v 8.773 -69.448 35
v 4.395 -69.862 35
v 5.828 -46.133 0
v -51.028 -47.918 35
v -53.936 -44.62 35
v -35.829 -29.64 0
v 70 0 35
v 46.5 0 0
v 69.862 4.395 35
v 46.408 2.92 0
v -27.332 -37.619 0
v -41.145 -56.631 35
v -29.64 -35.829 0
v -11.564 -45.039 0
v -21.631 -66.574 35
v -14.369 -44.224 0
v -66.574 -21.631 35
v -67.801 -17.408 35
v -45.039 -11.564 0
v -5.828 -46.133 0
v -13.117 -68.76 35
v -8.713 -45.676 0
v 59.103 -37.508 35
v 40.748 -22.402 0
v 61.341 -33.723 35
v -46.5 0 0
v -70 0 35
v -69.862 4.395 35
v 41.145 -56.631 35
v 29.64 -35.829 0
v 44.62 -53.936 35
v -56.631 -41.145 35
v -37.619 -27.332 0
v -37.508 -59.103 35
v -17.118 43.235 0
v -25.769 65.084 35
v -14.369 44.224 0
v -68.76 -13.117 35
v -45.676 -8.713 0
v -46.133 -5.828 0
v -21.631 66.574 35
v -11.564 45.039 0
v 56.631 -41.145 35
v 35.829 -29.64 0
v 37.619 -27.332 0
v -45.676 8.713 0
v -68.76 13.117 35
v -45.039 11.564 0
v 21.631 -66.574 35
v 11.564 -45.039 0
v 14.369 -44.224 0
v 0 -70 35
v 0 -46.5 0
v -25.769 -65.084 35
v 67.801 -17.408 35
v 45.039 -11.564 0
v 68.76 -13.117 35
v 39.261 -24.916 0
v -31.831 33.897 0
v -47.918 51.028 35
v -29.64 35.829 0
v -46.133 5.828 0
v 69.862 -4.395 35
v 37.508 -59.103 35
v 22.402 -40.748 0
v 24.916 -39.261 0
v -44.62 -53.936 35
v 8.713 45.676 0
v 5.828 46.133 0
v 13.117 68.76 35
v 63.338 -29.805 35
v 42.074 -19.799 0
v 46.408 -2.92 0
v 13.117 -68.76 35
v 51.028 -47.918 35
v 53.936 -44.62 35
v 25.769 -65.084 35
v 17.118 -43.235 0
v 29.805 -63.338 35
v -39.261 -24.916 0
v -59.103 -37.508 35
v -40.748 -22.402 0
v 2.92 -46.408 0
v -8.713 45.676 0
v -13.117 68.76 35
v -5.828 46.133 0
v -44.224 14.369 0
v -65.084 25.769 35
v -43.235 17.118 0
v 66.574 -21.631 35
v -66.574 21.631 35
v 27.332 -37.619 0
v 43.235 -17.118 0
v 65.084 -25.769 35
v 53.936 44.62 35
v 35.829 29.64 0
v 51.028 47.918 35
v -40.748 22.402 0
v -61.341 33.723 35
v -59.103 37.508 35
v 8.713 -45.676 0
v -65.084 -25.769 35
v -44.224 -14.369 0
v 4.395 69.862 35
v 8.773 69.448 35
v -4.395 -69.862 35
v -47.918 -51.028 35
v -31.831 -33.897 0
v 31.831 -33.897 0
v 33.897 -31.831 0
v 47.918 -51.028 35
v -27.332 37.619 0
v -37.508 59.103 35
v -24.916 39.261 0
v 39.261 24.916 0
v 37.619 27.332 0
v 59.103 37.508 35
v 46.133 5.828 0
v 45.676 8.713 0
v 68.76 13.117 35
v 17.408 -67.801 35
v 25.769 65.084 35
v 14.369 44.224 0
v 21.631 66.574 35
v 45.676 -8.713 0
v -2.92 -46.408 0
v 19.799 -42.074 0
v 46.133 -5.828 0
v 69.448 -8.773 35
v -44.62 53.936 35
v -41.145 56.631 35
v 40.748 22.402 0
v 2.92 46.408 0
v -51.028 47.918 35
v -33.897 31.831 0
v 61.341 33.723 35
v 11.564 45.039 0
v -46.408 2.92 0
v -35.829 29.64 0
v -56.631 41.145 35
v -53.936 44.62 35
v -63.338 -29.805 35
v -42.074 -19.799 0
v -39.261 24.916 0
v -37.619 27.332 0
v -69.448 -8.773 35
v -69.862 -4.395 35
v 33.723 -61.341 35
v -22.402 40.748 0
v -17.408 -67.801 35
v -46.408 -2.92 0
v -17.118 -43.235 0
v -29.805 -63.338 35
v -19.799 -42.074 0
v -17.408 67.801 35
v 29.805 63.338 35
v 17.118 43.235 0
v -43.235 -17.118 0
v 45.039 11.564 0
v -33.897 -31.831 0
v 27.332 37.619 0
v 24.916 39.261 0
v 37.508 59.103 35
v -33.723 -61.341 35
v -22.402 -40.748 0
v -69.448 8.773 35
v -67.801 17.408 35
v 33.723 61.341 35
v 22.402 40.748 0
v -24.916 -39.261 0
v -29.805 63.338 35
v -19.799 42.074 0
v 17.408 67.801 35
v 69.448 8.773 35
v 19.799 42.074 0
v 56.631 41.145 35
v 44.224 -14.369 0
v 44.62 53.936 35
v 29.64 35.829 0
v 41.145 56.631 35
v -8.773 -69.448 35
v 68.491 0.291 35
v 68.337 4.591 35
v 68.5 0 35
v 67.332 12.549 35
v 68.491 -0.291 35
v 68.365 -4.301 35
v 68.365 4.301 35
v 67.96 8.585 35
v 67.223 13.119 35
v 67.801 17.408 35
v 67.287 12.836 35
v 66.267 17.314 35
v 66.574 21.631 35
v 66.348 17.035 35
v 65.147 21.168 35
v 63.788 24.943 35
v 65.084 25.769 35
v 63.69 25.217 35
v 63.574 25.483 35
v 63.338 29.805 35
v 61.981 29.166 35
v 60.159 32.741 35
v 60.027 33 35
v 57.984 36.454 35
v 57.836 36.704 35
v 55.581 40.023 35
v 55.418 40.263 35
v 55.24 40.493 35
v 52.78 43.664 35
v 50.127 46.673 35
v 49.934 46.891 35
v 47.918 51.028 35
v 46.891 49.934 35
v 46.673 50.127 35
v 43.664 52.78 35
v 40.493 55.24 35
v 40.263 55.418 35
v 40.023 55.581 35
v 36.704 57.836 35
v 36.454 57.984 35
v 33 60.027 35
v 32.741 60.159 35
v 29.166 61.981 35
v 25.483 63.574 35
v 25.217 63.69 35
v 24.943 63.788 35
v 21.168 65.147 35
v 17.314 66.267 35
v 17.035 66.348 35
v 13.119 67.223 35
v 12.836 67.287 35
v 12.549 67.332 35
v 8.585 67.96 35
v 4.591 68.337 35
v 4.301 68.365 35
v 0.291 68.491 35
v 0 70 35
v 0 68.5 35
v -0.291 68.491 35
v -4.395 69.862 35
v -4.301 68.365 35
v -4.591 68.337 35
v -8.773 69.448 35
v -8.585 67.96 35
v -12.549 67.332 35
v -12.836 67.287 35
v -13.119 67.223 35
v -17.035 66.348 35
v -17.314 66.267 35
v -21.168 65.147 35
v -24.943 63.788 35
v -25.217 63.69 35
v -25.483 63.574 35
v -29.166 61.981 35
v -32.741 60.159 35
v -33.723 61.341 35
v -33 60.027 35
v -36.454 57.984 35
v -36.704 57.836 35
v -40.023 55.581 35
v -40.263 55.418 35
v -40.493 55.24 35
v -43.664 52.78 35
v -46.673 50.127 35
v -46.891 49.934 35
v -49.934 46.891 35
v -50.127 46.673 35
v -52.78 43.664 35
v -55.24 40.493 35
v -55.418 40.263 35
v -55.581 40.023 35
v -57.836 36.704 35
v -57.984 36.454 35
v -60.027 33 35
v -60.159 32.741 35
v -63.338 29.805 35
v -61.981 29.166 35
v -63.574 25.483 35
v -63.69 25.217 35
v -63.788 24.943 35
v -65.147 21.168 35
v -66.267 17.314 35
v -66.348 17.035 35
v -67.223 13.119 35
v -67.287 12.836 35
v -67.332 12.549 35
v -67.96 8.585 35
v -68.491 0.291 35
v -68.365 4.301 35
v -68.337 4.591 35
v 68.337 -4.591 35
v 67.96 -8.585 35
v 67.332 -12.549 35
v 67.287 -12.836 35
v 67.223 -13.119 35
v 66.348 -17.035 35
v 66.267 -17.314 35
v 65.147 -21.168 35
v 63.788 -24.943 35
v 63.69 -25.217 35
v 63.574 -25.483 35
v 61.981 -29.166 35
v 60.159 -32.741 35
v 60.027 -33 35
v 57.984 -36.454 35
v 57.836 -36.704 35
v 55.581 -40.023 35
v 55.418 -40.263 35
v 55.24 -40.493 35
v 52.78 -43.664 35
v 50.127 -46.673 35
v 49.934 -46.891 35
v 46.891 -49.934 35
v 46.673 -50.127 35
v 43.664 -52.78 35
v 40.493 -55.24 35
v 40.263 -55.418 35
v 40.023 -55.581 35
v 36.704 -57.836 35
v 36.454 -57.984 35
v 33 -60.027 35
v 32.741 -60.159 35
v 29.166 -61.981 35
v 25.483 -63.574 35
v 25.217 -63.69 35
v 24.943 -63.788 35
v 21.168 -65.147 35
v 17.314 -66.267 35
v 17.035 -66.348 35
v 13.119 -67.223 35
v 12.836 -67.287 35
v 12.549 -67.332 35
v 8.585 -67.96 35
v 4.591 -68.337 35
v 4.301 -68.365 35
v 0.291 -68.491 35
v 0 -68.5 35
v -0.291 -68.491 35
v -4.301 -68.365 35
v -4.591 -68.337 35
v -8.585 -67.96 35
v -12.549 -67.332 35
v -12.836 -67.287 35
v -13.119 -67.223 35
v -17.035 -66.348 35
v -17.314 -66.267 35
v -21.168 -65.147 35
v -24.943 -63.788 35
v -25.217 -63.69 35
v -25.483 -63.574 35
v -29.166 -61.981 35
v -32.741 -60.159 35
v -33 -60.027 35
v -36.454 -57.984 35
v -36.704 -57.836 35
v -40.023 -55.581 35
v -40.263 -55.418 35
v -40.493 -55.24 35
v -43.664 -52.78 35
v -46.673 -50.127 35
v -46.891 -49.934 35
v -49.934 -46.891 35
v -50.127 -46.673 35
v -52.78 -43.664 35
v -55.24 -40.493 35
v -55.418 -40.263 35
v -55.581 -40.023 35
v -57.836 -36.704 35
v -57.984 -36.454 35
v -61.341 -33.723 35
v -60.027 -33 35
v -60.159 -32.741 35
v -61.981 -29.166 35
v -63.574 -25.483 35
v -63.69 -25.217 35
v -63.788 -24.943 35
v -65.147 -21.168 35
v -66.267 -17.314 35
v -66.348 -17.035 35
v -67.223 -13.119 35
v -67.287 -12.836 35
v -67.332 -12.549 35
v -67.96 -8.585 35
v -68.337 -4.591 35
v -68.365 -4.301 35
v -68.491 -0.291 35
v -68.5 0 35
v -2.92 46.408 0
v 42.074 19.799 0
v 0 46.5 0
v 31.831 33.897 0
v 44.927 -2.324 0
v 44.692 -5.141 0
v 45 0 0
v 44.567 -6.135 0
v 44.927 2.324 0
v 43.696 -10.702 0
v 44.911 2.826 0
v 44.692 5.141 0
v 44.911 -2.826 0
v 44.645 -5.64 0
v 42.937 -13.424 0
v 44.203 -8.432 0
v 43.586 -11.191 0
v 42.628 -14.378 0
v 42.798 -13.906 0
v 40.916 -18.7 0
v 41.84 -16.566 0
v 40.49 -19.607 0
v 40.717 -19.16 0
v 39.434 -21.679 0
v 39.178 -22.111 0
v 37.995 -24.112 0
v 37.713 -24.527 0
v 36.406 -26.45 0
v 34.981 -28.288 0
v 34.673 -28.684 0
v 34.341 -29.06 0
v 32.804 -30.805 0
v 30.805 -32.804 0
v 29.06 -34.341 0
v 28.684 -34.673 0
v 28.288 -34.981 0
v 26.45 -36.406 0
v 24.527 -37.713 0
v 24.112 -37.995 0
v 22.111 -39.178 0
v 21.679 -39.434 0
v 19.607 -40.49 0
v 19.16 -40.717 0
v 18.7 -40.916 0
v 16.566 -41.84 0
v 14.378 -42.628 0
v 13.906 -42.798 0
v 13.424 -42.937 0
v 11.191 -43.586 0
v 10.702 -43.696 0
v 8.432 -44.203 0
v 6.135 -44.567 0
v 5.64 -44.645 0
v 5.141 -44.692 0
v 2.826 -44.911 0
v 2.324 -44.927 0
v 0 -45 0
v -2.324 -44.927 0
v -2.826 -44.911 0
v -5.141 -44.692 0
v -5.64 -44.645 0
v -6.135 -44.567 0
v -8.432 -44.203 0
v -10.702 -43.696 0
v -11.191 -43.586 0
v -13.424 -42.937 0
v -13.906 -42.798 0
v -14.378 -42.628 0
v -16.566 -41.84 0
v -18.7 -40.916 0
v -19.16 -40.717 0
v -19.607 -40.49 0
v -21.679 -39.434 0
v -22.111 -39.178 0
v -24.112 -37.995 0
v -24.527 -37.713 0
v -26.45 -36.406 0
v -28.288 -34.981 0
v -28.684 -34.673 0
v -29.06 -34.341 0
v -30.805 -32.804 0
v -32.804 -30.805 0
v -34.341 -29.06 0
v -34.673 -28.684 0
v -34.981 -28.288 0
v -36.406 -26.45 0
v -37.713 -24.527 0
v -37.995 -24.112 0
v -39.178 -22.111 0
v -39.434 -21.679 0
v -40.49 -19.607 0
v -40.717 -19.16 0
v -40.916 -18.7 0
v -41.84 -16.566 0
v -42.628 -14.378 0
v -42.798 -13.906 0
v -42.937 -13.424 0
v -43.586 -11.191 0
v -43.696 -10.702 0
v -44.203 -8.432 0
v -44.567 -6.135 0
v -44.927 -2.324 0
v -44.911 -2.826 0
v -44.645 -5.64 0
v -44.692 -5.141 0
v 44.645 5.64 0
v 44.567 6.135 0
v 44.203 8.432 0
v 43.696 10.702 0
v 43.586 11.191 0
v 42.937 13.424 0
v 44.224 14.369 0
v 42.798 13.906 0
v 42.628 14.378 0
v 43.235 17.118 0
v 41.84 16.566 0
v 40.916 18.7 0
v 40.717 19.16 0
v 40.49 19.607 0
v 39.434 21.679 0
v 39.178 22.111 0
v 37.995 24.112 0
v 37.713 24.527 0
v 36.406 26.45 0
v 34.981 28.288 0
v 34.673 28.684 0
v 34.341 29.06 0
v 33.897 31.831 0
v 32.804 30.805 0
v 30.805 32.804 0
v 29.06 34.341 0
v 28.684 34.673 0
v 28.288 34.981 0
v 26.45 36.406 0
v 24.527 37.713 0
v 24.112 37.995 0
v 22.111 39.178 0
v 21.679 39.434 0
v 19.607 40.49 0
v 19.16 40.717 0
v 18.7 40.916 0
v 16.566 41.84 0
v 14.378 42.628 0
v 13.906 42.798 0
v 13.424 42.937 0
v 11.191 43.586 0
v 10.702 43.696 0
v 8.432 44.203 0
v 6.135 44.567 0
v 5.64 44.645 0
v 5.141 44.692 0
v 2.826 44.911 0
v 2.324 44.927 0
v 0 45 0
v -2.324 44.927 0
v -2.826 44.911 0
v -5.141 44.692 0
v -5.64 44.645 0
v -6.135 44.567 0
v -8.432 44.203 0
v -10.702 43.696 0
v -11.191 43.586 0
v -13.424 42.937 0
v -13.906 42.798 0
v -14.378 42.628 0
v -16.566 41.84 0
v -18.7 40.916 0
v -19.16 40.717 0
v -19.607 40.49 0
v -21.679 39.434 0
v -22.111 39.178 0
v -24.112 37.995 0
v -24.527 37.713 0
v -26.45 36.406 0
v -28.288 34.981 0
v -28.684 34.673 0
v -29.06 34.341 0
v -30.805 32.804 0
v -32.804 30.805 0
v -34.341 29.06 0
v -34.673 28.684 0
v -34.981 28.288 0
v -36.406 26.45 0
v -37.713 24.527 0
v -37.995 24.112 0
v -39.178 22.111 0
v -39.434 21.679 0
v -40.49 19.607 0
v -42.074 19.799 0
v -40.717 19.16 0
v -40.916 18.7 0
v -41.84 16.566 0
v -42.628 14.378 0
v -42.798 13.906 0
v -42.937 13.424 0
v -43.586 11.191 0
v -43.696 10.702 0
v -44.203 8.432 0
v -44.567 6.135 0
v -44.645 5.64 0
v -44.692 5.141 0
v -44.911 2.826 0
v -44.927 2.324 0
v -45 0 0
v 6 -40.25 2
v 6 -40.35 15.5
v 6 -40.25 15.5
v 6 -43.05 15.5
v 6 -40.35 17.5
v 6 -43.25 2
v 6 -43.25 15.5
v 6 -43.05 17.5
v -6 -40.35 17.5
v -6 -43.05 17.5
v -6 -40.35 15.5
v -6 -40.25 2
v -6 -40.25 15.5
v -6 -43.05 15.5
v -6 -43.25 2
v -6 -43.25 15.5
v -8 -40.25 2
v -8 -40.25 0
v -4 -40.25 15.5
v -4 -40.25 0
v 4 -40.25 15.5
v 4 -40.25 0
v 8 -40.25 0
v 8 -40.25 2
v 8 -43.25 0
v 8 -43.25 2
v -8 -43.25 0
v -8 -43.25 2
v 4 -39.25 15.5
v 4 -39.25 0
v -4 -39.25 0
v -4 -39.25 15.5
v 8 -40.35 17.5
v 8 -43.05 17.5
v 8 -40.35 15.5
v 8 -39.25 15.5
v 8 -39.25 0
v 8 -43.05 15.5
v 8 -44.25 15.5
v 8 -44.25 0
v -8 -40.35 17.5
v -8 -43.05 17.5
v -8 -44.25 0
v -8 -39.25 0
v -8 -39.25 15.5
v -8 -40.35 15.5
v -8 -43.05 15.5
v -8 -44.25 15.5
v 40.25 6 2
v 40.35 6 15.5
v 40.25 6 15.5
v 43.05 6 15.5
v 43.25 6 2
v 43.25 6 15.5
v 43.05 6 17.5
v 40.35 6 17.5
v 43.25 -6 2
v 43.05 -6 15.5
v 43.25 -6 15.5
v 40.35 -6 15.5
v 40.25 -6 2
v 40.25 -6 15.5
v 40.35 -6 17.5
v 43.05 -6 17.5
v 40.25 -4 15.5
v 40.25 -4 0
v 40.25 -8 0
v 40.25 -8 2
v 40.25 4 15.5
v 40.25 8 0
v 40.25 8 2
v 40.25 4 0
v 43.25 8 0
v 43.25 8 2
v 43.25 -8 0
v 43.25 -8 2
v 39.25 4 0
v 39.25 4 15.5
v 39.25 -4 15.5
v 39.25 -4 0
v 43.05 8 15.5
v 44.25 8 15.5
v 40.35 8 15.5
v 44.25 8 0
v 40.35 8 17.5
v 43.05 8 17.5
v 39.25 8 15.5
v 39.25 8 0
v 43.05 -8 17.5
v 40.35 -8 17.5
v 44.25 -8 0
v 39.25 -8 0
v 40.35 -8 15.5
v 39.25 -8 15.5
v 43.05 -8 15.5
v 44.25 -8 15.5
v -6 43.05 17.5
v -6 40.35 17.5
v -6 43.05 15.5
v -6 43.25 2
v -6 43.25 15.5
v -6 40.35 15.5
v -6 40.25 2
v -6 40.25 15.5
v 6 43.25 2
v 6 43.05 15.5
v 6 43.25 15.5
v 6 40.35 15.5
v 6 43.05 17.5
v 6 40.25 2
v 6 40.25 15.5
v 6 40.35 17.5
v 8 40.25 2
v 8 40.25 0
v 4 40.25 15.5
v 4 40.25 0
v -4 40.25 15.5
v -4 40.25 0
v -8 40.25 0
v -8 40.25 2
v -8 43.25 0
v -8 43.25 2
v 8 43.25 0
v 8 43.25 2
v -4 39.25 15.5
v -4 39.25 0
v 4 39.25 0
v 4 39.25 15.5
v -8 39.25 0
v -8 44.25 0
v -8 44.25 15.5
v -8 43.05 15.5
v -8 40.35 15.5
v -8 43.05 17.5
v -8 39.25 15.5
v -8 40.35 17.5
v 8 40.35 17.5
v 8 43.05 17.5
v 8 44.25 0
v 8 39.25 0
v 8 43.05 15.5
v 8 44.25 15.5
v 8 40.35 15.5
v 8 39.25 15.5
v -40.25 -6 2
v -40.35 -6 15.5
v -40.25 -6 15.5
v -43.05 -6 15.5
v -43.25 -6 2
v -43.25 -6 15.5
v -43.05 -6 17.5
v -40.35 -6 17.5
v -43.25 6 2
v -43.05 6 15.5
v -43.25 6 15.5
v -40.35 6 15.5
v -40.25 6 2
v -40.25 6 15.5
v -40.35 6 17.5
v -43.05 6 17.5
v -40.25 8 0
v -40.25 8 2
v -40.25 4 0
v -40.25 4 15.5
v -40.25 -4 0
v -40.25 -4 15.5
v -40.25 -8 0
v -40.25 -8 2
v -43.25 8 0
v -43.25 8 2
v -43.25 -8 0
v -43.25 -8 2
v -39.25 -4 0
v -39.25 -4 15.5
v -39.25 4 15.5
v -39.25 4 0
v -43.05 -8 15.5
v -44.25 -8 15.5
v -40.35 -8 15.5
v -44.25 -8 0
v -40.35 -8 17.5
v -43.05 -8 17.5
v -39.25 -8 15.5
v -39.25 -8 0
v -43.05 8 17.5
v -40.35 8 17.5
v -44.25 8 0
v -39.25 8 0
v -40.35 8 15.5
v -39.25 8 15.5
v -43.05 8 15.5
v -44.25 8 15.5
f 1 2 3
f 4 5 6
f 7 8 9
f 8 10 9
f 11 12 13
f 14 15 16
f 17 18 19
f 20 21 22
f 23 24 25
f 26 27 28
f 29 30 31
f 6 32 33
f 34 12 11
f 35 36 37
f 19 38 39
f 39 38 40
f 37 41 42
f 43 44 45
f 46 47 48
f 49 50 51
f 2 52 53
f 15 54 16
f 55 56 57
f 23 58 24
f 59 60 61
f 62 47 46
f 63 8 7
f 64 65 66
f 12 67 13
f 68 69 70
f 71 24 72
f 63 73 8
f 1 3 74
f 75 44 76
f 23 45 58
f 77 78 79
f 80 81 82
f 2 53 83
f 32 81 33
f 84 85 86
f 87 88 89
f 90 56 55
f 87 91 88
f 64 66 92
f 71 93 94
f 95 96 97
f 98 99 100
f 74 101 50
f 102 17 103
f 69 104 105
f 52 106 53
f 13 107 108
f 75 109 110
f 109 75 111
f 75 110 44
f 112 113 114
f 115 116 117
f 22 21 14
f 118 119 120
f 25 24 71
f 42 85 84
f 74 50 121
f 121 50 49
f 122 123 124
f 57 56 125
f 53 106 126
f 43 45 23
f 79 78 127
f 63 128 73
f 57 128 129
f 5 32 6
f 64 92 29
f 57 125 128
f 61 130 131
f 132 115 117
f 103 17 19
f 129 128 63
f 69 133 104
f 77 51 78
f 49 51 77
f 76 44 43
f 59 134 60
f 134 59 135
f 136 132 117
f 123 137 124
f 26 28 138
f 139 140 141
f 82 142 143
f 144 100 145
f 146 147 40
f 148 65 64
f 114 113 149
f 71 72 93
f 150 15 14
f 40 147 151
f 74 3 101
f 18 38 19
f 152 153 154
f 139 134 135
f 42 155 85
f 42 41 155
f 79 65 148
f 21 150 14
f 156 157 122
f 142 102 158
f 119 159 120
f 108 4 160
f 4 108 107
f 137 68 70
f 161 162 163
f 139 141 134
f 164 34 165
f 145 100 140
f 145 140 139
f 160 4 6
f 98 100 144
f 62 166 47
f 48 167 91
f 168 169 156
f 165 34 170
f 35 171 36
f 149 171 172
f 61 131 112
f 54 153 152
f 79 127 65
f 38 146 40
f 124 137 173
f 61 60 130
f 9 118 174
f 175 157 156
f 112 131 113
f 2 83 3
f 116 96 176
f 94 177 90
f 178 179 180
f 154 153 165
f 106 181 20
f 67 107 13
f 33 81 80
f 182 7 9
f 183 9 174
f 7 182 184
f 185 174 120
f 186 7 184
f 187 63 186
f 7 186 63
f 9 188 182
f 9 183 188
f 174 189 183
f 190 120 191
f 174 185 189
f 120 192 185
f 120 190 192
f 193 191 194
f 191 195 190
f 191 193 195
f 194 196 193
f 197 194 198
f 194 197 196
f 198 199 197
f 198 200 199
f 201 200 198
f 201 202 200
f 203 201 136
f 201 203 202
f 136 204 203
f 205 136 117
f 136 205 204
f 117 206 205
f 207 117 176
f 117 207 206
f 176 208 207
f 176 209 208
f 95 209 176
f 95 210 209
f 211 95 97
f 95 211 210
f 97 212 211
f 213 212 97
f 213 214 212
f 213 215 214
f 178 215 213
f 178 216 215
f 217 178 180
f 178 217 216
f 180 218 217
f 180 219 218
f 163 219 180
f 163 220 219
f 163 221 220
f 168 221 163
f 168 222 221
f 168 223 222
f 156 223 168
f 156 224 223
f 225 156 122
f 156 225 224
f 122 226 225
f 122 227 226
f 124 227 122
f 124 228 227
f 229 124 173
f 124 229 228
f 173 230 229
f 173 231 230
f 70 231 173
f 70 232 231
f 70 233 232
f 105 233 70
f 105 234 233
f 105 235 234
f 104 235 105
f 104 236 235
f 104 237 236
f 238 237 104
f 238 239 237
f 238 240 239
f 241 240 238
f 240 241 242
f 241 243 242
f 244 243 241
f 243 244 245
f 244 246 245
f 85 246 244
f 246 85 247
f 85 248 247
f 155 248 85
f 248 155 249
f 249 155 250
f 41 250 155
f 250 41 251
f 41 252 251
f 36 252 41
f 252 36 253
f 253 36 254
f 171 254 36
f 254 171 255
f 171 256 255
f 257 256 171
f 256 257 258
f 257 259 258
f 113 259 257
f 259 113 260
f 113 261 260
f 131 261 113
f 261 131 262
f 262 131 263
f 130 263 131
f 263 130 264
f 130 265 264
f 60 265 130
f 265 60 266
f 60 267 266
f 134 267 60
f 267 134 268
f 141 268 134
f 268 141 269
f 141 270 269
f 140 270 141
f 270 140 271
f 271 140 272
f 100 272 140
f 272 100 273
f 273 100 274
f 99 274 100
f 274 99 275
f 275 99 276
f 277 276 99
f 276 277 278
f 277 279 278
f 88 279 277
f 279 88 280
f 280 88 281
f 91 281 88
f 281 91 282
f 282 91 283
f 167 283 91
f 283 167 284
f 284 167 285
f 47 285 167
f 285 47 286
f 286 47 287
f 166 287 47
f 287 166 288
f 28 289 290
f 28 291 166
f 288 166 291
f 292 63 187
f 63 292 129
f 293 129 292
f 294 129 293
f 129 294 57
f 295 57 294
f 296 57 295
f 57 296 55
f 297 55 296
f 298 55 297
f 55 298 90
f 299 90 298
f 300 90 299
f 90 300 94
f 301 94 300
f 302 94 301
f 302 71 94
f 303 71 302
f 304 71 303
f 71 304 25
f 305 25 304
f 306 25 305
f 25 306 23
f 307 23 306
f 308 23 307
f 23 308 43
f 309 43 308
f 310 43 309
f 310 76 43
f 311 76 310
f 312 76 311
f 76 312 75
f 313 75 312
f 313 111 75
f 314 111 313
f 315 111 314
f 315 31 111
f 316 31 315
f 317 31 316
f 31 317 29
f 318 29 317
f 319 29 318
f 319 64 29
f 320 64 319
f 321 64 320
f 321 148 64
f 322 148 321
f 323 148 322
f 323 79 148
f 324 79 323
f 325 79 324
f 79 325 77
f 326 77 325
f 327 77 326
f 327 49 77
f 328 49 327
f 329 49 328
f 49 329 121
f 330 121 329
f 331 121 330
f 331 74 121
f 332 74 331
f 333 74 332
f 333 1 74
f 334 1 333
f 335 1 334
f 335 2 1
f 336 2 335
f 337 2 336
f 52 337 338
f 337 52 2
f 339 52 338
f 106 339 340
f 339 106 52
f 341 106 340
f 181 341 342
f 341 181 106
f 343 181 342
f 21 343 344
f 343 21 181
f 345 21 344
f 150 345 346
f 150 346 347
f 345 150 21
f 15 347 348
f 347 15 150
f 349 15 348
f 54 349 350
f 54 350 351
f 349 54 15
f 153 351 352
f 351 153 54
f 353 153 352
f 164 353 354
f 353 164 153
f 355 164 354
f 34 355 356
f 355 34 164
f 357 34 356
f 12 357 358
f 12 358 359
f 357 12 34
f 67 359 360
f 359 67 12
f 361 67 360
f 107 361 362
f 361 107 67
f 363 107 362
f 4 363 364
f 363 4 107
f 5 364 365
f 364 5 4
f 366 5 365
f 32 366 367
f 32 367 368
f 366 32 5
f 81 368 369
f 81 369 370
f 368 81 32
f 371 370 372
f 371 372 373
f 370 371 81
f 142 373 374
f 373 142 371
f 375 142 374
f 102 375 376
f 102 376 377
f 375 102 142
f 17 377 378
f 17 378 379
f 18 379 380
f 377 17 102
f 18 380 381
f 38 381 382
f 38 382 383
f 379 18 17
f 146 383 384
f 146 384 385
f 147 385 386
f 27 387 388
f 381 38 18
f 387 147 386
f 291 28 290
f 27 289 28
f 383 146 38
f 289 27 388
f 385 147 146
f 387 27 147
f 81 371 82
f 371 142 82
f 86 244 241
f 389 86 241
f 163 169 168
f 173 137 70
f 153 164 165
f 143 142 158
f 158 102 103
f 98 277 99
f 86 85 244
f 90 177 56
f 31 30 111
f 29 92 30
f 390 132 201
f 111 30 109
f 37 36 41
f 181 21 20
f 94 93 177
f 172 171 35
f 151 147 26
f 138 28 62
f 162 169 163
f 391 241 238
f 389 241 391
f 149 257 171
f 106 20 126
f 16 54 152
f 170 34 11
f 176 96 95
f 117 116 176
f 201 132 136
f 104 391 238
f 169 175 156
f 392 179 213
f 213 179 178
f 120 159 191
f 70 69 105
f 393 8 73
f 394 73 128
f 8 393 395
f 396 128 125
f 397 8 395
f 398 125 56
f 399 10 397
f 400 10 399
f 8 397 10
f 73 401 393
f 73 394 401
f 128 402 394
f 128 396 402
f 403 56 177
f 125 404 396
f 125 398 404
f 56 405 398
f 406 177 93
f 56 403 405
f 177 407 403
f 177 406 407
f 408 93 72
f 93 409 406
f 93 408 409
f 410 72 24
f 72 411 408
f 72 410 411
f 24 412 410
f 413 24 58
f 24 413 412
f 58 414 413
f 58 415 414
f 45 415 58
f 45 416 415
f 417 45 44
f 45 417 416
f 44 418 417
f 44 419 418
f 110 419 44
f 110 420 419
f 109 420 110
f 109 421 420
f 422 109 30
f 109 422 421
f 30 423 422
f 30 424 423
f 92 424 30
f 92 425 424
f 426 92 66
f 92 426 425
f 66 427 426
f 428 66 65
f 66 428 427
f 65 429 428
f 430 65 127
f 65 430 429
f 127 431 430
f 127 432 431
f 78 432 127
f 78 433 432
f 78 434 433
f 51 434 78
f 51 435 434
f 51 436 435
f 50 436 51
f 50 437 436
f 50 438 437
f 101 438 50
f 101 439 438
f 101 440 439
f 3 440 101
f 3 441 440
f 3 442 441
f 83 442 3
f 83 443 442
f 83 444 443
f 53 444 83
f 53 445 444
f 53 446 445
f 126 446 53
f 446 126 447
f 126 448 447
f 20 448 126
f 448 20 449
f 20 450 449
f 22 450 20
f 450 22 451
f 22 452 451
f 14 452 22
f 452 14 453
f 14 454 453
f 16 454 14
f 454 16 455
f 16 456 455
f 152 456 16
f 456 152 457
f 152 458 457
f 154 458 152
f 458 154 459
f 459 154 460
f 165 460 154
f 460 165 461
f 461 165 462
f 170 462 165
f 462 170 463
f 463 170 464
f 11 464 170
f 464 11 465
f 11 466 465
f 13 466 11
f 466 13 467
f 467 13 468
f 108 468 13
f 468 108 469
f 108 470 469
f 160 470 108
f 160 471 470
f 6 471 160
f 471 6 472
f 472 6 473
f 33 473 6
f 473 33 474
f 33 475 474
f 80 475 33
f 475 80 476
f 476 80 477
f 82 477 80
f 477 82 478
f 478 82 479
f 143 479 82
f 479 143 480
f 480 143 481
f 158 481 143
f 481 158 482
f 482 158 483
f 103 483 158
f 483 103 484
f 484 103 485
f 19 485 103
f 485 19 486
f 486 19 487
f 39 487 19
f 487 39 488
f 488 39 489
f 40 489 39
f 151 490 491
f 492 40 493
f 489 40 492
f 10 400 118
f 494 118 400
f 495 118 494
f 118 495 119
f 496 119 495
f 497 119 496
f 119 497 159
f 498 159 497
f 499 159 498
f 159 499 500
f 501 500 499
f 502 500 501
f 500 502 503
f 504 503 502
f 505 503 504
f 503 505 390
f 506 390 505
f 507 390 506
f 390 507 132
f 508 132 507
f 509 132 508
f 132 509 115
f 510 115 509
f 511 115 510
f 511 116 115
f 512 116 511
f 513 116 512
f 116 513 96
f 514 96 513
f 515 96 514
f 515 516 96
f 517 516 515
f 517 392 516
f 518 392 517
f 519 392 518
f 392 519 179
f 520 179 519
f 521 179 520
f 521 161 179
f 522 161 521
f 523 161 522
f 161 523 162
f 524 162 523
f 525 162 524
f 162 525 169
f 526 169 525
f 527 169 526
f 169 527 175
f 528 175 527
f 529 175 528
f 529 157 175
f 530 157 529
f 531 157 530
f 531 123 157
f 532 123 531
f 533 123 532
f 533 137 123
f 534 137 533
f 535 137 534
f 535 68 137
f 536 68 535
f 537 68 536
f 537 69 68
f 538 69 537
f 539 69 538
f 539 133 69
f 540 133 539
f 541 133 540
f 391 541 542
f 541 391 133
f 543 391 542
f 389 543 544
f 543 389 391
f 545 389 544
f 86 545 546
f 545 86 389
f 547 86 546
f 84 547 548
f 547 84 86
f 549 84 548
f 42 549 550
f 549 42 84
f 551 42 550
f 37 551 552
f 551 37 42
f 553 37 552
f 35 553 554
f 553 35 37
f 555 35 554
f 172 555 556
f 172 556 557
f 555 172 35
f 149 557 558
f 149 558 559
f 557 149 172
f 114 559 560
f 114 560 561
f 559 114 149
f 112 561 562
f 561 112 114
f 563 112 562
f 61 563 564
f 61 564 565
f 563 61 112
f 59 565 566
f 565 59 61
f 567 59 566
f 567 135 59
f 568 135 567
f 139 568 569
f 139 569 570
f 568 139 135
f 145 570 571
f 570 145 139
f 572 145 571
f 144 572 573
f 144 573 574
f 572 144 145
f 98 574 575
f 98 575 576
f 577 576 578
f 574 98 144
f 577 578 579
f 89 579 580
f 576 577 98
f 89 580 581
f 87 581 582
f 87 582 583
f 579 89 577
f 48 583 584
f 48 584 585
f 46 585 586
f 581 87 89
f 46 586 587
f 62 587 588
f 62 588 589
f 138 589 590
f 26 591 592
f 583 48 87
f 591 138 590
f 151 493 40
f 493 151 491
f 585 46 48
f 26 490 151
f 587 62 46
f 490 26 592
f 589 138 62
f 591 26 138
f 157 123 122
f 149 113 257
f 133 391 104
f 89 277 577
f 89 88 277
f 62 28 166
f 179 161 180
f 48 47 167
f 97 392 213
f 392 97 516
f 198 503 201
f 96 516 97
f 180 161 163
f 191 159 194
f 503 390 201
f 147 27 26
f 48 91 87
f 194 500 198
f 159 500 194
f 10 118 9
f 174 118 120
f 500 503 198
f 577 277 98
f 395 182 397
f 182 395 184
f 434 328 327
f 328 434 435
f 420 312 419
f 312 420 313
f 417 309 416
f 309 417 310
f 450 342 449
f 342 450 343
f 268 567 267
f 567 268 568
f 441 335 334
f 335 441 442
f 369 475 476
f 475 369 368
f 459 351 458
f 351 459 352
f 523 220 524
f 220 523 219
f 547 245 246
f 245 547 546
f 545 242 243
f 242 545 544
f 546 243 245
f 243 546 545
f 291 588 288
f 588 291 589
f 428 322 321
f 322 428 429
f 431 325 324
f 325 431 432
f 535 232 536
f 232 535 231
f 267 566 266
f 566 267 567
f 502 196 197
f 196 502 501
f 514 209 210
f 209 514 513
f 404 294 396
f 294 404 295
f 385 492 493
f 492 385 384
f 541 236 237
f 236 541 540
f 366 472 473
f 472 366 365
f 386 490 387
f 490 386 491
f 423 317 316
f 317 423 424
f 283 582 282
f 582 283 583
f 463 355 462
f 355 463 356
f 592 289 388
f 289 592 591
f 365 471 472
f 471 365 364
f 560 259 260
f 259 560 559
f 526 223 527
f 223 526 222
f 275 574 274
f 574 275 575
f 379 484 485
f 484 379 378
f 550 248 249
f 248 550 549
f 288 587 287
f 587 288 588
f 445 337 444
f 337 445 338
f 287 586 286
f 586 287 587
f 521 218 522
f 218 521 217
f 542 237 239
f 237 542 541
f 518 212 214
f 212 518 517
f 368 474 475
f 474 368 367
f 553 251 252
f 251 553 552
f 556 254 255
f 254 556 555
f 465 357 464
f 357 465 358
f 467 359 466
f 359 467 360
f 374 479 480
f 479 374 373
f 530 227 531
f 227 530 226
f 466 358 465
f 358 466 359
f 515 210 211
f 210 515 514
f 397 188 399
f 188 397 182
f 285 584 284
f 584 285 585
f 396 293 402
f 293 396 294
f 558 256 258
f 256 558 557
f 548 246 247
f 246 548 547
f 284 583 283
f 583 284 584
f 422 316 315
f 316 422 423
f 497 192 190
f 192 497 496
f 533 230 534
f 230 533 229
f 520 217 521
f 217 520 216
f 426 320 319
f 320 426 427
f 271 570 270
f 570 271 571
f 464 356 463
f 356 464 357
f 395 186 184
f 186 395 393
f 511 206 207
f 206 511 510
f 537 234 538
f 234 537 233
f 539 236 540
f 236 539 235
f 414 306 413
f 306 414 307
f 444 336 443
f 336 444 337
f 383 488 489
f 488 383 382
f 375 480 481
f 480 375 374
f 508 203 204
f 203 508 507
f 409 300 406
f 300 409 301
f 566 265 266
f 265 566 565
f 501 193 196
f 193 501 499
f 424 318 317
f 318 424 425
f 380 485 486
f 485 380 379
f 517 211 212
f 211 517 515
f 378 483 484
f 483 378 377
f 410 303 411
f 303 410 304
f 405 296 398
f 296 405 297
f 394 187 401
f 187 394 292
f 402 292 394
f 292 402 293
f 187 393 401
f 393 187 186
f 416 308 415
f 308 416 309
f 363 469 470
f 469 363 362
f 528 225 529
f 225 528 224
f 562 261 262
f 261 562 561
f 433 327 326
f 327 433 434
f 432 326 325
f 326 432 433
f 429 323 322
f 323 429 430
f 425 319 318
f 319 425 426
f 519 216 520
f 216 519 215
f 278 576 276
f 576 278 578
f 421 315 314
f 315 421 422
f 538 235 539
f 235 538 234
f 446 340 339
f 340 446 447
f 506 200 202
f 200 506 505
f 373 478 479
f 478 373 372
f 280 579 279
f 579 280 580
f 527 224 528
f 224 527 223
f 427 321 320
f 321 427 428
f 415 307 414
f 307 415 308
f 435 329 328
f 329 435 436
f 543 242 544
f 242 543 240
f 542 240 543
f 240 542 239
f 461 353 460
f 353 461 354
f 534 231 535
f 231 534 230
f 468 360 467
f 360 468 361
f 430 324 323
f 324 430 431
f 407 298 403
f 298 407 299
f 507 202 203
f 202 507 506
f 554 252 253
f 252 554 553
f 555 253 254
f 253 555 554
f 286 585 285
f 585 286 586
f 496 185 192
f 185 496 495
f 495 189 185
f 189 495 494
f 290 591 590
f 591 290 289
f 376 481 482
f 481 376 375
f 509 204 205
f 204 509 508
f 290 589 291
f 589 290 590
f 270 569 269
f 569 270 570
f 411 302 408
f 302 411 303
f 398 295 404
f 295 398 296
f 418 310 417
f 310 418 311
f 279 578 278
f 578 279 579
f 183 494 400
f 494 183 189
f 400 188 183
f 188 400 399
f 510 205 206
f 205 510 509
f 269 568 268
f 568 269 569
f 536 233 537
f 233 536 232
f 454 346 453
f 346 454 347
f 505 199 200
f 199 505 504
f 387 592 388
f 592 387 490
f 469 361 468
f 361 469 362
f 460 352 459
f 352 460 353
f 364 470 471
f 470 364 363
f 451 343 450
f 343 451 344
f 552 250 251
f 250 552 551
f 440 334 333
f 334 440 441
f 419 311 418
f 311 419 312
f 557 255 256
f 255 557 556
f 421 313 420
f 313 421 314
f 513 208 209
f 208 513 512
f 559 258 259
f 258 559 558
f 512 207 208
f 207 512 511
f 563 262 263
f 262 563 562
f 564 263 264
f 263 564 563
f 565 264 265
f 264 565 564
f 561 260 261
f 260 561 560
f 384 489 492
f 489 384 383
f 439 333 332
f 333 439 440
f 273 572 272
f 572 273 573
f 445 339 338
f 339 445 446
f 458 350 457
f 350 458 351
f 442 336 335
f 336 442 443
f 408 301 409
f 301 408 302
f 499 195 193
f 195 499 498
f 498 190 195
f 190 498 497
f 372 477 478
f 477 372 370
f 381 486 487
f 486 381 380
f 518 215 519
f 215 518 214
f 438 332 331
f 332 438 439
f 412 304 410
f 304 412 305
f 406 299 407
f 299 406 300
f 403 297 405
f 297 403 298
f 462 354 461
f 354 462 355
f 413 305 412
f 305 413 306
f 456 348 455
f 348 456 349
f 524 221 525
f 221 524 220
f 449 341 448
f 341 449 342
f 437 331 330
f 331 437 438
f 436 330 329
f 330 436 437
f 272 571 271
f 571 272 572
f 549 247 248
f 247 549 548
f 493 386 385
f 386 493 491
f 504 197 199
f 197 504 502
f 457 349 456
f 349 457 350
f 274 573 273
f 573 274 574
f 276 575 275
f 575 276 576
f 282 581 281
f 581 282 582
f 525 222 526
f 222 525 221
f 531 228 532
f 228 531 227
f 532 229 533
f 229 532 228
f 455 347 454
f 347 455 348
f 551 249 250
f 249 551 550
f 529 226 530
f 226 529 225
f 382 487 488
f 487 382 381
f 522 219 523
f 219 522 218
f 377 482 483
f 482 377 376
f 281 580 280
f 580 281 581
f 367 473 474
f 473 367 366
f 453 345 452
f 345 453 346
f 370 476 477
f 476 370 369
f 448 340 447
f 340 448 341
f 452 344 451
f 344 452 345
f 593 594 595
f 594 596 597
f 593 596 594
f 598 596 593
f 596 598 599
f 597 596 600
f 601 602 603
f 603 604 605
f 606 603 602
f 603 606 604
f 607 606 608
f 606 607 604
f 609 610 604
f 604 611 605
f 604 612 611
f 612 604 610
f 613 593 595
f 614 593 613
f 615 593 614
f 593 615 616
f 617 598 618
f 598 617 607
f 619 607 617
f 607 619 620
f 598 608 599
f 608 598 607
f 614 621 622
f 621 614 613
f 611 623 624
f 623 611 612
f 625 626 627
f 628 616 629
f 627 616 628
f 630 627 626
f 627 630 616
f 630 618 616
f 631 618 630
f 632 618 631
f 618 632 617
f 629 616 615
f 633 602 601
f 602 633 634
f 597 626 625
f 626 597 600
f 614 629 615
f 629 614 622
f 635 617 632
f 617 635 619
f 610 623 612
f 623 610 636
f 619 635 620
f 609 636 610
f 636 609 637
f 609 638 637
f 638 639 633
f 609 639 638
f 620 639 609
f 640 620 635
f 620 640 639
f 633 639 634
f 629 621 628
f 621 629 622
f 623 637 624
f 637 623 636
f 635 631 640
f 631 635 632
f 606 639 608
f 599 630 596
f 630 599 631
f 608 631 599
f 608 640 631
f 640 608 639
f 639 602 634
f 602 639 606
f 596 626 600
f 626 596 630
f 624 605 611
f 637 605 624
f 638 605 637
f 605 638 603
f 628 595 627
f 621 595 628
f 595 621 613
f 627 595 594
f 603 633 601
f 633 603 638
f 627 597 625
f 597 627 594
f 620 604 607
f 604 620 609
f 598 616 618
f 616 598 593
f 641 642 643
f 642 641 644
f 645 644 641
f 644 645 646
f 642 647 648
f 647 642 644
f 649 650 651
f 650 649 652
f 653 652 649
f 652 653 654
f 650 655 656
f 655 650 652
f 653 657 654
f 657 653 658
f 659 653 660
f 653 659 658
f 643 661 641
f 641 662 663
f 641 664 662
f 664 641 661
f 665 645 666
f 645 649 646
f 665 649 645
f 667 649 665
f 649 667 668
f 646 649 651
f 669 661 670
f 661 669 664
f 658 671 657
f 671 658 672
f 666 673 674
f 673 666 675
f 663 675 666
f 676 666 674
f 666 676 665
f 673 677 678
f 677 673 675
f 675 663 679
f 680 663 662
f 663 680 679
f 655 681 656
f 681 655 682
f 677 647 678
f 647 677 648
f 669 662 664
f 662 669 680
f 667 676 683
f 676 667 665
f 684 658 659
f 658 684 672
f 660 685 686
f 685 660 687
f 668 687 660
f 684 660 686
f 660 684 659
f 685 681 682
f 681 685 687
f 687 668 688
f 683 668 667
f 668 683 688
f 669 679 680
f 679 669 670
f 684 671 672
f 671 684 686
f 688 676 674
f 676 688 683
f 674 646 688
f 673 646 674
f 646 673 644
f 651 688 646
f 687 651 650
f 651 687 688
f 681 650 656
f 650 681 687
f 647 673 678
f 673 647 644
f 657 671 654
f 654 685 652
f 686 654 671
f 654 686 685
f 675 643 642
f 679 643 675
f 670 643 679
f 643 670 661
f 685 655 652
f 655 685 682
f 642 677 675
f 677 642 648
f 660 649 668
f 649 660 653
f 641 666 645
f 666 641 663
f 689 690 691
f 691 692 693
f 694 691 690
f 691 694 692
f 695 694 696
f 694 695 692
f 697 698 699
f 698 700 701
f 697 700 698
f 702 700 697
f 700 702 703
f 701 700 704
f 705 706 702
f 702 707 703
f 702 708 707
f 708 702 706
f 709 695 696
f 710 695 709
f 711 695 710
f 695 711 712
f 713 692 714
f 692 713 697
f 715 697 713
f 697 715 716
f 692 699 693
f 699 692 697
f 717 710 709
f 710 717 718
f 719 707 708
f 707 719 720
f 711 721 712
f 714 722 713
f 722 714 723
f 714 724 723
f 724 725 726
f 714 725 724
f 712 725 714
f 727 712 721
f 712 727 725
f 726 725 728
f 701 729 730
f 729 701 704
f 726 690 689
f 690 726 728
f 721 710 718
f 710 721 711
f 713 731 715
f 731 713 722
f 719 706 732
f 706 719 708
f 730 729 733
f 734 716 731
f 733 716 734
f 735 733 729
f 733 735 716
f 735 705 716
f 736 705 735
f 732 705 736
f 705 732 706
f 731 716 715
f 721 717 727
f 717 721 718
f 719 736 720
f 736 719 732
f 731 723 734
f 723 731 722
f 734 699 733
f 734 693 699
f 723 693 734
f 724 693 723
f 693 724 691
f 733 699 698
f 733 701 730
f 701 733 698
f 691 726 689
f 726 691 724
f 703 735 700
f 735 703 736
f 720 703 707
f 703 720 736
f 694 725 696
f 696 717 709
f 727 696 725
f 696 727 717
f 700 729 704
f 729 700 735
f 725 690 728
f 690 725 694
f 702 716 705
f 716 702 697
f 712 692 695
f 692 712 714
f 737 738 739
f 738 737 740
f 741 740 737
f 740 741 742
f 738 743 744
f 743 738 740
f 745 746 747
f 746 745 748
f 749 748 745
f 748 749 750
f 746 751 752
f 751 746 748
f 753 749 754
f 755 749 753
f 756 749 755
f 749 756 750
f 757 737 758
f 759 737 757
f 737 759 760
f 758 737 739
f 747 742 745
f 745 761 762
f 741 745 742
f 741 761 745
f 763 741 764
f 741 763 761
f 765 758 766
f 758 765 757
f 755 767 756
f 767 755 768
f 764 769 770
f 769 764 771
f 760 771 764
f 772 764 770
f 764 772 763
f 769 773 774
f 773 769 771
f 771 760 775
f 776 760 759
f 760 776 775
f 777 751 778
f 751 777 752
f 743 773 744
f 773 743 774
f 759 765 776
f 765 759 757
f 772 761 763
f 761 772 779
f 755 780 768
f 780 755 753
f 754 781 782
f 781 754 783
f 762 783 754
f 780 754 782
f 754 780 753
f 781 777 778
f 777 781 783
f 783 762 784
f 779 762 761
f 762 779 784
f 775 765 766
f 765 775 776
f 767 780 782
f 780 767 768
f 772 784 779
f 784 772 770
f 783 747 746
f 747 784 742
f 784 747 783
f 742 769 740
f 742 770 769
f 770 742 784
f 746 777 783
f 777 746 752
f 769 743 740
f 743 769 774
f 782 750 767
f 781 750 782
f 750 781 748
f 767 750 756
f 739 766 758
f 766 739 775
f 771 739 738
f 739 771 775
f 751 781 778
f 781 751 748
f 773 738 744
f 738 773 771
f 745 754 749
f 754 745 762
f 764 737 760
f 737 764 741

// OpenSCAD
// file: radiation_shield_lib.scad
// define modules
module cap(ri, ro, h_cap, d_wall) {
  difference() {
  cylinder(r=ri+d_wall, r2=ro, h=h_cap);
  t = (ro - d_wall - ri) / h_cap;
  h = 5;
  r_i = ri - t * h;
  r_o = t * h + ro - d_wall;
  translate([0,0,-h]) cylinder(r1=r_i, r2= r_o, h=h_cap+2*h);
  }
}

module profile(h) {
  //translate([p_w/2,0,0])
  difference() {
    cube([p_w, p_d, h]);
    union() {
      translate([(p_w-p_o_w)/2,(p_d-p_o_d)/2,-0.25*h])
      cube([p_o_w, p_o_d, 1.5*h]);
      
      translate([(p_w-p_o_s_w)/2,p_d-1.5*(p_d-p_o_d)/2,-0.25*h]) 
      cube([p_o_s_w, 2*p_o_d, 1.5*h]);

    }
  }
}

module profile2(h, lock_buttom=true) {
    difference() {
        profile(h=h);
        if(lock_buttom){
      color("blue") translate([-p_w/2,-2*lock_d+p_d/2-lock_d/2,h-lock_h]) cube([2*p_w, 2*lock_d+2*lock_margin, 2*lock_h]);
      color("blue") translate([-p_w/2,p_d-(p_d/2-lock_d/2)-lock_margin,h-lock_h]) cube([2*p_w, 2*lock_d+4*lock_margin, 2*lock_h]);
        }
        color("green") translate([-p_w/2,(p_d-lock_d)/2,-lock_h]) cube([2*p_w, lock_d, 2*lock_h]);
        //color("green") translate([-p_w/2,-lock_d+0.3*d_wall,-1.8*lock_h]) cube([2*p_w, lock_d, 2*lock_h]);
    }
      

}


module top_cap() {

  difference() {
    cylinder(r1=r_inner, r2=r_outer, h=h_cap);
    translate([0,0,d_wall]) cylinder(r1=r_inner-d_wall, r2=r_outer-d_wall, h=h_cap-d_wall);
  }
  //translate([0,0,-h_cap/6]) cylinder(r1=0, r2=r_inner, h=h_cap/6);

}

module buttom_cap() {
  t = h_cap / (r_outer - r_inner);
  r_o = r_outer - d_wall;
  dr = (h_cap + d_wall) / t;
  ri = r_outer - d_wall - dr;
  difference() {
    union() {
      difference(){
        difference() {
          cylinder(r1=r_inner, r2=r_outer, h=h_cap);
          translate([0,0,-d_wall]) color("white") cylinder(r1=ri, r2= r_o, h=h_cap);
        }
        color("red") translate([0,0,h_cap-2*d_wall]) cylinder(r1=r_inner-d_wall, r2=r_inner-d_wall, h=8*d_wall);
      }
      for(i = [45:90:360-45]) {
        rotate(a=i, v=[0,0,1]) translate([r_inner, -1.5*nut_re, h_cap-nut_h-d_wall]) nut_support();
      }
    }
    union() {
      for(i = [45:90:360-45]) {
        rotate(a=i, v=[0,0,1]) translate([r_inner+1.5*nut_re, 0, h_cap - nut_h]) scale([1,1,2]) nut(h=nut_h, rh=nut_r, re=nut_re, margin=nut_margin);
        rotate(a=i, v=[0,0,1]) translate([r_inner+1.5*nut_re, 0, h_cap]) cylinder(r=nut_r + nut_margin, h=3*nut_h, center=true);
      }
    }
  }
}


module nut(h, rh, re, margin, fill=false) {
// h height of nut
// r radius of screw wire
// w width of nut between two horizontal sides

r = rh + margin;
ro = re + margin;
order = 6;
angles=[ for (i = [0:order-1]) i*(360/order) ];
   coords=[ for (th=angles) [ro*cos(th), ro*sin(th)] ];
   if(fill){
    linear_extrude(height=h) polygon(coords);
   } else {
    linear_extrude(height=h)
    difference(){
      polygon(coords);
      circle(r=r);
    }
   }
}

module nut2(h, r, w, margin) {
// h height of nut
// r radius of screw wire
// w width of nut between two horizontal sides

s = w/(2 * sin(30));
x = w/(2 * tan(30));
ro = w/2+x + margin;
order = 6;
angles=[ for (i = [0:order-1]) i*(360/order) ];
   coords=[ for (th=angles) [ro*cos(th), ro*sin(th)] ];
   linear_extrude(height=h)
   difference(){
   
  polygon(coords);
  circle(r=r);
   }
}

module nut_support() {
  h = nut_h + 3*nut_h;
  t = h_cap / (r_outer - r_inner);
  dr = h / t;
  ri = r_outer - dr;
  dx = 2*(r_outer - r_opening); //(r_outer - r_inner);


  sc_points = [
    [0,0,0], [dx-dr, 0,0], [dx-dr, h, 0], [0, h, 0], 
    [0,0,h-nut_h], [dx-dr, 0,0], [dx-dr, h, ], [0, h, h-nut_h]];

  ps_faces = [
    [0, 1, 2, 3], // bottom
    [7, 6, 5, 4], // top
    [0, 4, 5, 1], // front
    [1, 5, 6, 2], // right
    [3, 7, 4, 0], // left
    [2, 6, 7, 3], // back
  ];

  points = [[0,0], [0,h-1.5*nut_h], [dx-dr, 0]];



  difference()
  {

    translate([-r_outer+dx,1.5*nut_re,0])
    difference()
    {
      intersection() {
        cylinder(r1=ri, r2=r_outer, h=h);
        //translate([0,0,-t*r_o + h_cap - d_wall]) cylinder(r1=0, r2= r_o, h=t*r_o);
        translate([0,-1.5*nut_re,-nut_h/2]) 
        cube([2*r_outer, 3*nut_re, 2*h]);
      }
      cube([2*(r_outer - dx), dx, 3*h], center=true);
      
      //color("red") translate([0,0,h_cap-2*d_wall]) cylinder(r1=r_inner-d_wall, r2=r_inner, h=8*d_wall);
    }

    translate(-[dx-dr,3.5*nut_re,h-3*d_wall]/2) 
    scale([2,2,2])
    translate([0, 3.5*nut_re, 0]) 
    rotate(a=90, v=[1,0,0]) 
    color("black") 
    linear_extrude(height=4*nut_re) 
    polygon(points=points);
    
    //translate([0,-2.5*nut_re/2,0]) color("white") polyhedron(points = sc_points, faces = ps_faces, connectivity = 3);
  }
}
// file: parameters.scad
$fn=100;

// all in mm
// thickness of the outer wall
d_wall = 1.5;

// outer radius of cone (incl. wall)
r_outer = 70;

// inner diameter of cone (incl. wall)
r_inner = 45;

r_opening = (r_inner+r_outer)/2;

// total height of the cap
h_cap = 35;

// distance between two caps (used for height)
cap_sep = 0.5*h_cap; // separation distance (as fraction of h_cap)

// total number of caps (incl. top and bottom cap, must be at least 2)
n_caps = 6;

// width of profile (tangent to inner circle)
p_w = 16;

// depth of profile (perpendicular to inner circle)
p_d = 5;

// width of opening in the profile (parallel to inner circle tangent)
p_o_w = 12;

// depth of opening in the profile
p_o_d = 3;

// width of slot in profile
p_o_s_w = 8;

// for more info on nut dimensions:
// https://en.wikipedia.org/wiki/Nut_(hardware)#Standard_metric_hex_nuts_sizes

// nut to attach internal and external shield
// height of the nut
nut_h = 3.2;

// inner radius of the nut
nut_r = 4/2;

// outer radius of the nut
nut_re = 8.1/2;

// margin used around to make sure nut fits
nut_margin = 0.1;

// nut to connect boards
// height of the nut
nut_bc_h = 2.4;

// inner radius of the nut
nut_bc_r = 3.0/2;

// outer radius of the nut
nut_bc_re = 6.4/2;

// margin used around to make sure nut fits
nut_bc_margin = 0.05;

// lock depth (height of upper part and)
lock_h = 2;
lock_d = 3;
lock_margin = 0.1;

p_margin = 0.5;
p_o_wm = p_o_w - p_margin;
p_o_dm = p_o_d - p_margin;

// for the additional support of beams in inner part
bs_margin = 3;
bs_margin_h = 3;

ps_margin = 5; //
ps_margin_h = 5;

// hook parameters

// radius of the two holes to mount
hook_opening_r = 2.5;

// length of one side of the hook (full length)
hook_length = 80;

// width of the hook
hook_width = 18;
// thickness
hook_thickness = 2;

// location of first hole, measured from the outer edge (away from right angle)
hole1_center_d = 16;

// location of second hole, measured from the outer edge (away from right angle)
hole2_center_d = 62.5;
// main file
include <parameters.scad>

include <radiation_shield_lib.scad>


cap(r_inner, r_outer, h_cap, d_wall);

// draw support
for(i=[0:90:360]){
  rotate(v=[0,0,1], a=i) translate([-p_w/2,-r_inner+d_wall/2,0]) profile2(h=cap_sep);
}
